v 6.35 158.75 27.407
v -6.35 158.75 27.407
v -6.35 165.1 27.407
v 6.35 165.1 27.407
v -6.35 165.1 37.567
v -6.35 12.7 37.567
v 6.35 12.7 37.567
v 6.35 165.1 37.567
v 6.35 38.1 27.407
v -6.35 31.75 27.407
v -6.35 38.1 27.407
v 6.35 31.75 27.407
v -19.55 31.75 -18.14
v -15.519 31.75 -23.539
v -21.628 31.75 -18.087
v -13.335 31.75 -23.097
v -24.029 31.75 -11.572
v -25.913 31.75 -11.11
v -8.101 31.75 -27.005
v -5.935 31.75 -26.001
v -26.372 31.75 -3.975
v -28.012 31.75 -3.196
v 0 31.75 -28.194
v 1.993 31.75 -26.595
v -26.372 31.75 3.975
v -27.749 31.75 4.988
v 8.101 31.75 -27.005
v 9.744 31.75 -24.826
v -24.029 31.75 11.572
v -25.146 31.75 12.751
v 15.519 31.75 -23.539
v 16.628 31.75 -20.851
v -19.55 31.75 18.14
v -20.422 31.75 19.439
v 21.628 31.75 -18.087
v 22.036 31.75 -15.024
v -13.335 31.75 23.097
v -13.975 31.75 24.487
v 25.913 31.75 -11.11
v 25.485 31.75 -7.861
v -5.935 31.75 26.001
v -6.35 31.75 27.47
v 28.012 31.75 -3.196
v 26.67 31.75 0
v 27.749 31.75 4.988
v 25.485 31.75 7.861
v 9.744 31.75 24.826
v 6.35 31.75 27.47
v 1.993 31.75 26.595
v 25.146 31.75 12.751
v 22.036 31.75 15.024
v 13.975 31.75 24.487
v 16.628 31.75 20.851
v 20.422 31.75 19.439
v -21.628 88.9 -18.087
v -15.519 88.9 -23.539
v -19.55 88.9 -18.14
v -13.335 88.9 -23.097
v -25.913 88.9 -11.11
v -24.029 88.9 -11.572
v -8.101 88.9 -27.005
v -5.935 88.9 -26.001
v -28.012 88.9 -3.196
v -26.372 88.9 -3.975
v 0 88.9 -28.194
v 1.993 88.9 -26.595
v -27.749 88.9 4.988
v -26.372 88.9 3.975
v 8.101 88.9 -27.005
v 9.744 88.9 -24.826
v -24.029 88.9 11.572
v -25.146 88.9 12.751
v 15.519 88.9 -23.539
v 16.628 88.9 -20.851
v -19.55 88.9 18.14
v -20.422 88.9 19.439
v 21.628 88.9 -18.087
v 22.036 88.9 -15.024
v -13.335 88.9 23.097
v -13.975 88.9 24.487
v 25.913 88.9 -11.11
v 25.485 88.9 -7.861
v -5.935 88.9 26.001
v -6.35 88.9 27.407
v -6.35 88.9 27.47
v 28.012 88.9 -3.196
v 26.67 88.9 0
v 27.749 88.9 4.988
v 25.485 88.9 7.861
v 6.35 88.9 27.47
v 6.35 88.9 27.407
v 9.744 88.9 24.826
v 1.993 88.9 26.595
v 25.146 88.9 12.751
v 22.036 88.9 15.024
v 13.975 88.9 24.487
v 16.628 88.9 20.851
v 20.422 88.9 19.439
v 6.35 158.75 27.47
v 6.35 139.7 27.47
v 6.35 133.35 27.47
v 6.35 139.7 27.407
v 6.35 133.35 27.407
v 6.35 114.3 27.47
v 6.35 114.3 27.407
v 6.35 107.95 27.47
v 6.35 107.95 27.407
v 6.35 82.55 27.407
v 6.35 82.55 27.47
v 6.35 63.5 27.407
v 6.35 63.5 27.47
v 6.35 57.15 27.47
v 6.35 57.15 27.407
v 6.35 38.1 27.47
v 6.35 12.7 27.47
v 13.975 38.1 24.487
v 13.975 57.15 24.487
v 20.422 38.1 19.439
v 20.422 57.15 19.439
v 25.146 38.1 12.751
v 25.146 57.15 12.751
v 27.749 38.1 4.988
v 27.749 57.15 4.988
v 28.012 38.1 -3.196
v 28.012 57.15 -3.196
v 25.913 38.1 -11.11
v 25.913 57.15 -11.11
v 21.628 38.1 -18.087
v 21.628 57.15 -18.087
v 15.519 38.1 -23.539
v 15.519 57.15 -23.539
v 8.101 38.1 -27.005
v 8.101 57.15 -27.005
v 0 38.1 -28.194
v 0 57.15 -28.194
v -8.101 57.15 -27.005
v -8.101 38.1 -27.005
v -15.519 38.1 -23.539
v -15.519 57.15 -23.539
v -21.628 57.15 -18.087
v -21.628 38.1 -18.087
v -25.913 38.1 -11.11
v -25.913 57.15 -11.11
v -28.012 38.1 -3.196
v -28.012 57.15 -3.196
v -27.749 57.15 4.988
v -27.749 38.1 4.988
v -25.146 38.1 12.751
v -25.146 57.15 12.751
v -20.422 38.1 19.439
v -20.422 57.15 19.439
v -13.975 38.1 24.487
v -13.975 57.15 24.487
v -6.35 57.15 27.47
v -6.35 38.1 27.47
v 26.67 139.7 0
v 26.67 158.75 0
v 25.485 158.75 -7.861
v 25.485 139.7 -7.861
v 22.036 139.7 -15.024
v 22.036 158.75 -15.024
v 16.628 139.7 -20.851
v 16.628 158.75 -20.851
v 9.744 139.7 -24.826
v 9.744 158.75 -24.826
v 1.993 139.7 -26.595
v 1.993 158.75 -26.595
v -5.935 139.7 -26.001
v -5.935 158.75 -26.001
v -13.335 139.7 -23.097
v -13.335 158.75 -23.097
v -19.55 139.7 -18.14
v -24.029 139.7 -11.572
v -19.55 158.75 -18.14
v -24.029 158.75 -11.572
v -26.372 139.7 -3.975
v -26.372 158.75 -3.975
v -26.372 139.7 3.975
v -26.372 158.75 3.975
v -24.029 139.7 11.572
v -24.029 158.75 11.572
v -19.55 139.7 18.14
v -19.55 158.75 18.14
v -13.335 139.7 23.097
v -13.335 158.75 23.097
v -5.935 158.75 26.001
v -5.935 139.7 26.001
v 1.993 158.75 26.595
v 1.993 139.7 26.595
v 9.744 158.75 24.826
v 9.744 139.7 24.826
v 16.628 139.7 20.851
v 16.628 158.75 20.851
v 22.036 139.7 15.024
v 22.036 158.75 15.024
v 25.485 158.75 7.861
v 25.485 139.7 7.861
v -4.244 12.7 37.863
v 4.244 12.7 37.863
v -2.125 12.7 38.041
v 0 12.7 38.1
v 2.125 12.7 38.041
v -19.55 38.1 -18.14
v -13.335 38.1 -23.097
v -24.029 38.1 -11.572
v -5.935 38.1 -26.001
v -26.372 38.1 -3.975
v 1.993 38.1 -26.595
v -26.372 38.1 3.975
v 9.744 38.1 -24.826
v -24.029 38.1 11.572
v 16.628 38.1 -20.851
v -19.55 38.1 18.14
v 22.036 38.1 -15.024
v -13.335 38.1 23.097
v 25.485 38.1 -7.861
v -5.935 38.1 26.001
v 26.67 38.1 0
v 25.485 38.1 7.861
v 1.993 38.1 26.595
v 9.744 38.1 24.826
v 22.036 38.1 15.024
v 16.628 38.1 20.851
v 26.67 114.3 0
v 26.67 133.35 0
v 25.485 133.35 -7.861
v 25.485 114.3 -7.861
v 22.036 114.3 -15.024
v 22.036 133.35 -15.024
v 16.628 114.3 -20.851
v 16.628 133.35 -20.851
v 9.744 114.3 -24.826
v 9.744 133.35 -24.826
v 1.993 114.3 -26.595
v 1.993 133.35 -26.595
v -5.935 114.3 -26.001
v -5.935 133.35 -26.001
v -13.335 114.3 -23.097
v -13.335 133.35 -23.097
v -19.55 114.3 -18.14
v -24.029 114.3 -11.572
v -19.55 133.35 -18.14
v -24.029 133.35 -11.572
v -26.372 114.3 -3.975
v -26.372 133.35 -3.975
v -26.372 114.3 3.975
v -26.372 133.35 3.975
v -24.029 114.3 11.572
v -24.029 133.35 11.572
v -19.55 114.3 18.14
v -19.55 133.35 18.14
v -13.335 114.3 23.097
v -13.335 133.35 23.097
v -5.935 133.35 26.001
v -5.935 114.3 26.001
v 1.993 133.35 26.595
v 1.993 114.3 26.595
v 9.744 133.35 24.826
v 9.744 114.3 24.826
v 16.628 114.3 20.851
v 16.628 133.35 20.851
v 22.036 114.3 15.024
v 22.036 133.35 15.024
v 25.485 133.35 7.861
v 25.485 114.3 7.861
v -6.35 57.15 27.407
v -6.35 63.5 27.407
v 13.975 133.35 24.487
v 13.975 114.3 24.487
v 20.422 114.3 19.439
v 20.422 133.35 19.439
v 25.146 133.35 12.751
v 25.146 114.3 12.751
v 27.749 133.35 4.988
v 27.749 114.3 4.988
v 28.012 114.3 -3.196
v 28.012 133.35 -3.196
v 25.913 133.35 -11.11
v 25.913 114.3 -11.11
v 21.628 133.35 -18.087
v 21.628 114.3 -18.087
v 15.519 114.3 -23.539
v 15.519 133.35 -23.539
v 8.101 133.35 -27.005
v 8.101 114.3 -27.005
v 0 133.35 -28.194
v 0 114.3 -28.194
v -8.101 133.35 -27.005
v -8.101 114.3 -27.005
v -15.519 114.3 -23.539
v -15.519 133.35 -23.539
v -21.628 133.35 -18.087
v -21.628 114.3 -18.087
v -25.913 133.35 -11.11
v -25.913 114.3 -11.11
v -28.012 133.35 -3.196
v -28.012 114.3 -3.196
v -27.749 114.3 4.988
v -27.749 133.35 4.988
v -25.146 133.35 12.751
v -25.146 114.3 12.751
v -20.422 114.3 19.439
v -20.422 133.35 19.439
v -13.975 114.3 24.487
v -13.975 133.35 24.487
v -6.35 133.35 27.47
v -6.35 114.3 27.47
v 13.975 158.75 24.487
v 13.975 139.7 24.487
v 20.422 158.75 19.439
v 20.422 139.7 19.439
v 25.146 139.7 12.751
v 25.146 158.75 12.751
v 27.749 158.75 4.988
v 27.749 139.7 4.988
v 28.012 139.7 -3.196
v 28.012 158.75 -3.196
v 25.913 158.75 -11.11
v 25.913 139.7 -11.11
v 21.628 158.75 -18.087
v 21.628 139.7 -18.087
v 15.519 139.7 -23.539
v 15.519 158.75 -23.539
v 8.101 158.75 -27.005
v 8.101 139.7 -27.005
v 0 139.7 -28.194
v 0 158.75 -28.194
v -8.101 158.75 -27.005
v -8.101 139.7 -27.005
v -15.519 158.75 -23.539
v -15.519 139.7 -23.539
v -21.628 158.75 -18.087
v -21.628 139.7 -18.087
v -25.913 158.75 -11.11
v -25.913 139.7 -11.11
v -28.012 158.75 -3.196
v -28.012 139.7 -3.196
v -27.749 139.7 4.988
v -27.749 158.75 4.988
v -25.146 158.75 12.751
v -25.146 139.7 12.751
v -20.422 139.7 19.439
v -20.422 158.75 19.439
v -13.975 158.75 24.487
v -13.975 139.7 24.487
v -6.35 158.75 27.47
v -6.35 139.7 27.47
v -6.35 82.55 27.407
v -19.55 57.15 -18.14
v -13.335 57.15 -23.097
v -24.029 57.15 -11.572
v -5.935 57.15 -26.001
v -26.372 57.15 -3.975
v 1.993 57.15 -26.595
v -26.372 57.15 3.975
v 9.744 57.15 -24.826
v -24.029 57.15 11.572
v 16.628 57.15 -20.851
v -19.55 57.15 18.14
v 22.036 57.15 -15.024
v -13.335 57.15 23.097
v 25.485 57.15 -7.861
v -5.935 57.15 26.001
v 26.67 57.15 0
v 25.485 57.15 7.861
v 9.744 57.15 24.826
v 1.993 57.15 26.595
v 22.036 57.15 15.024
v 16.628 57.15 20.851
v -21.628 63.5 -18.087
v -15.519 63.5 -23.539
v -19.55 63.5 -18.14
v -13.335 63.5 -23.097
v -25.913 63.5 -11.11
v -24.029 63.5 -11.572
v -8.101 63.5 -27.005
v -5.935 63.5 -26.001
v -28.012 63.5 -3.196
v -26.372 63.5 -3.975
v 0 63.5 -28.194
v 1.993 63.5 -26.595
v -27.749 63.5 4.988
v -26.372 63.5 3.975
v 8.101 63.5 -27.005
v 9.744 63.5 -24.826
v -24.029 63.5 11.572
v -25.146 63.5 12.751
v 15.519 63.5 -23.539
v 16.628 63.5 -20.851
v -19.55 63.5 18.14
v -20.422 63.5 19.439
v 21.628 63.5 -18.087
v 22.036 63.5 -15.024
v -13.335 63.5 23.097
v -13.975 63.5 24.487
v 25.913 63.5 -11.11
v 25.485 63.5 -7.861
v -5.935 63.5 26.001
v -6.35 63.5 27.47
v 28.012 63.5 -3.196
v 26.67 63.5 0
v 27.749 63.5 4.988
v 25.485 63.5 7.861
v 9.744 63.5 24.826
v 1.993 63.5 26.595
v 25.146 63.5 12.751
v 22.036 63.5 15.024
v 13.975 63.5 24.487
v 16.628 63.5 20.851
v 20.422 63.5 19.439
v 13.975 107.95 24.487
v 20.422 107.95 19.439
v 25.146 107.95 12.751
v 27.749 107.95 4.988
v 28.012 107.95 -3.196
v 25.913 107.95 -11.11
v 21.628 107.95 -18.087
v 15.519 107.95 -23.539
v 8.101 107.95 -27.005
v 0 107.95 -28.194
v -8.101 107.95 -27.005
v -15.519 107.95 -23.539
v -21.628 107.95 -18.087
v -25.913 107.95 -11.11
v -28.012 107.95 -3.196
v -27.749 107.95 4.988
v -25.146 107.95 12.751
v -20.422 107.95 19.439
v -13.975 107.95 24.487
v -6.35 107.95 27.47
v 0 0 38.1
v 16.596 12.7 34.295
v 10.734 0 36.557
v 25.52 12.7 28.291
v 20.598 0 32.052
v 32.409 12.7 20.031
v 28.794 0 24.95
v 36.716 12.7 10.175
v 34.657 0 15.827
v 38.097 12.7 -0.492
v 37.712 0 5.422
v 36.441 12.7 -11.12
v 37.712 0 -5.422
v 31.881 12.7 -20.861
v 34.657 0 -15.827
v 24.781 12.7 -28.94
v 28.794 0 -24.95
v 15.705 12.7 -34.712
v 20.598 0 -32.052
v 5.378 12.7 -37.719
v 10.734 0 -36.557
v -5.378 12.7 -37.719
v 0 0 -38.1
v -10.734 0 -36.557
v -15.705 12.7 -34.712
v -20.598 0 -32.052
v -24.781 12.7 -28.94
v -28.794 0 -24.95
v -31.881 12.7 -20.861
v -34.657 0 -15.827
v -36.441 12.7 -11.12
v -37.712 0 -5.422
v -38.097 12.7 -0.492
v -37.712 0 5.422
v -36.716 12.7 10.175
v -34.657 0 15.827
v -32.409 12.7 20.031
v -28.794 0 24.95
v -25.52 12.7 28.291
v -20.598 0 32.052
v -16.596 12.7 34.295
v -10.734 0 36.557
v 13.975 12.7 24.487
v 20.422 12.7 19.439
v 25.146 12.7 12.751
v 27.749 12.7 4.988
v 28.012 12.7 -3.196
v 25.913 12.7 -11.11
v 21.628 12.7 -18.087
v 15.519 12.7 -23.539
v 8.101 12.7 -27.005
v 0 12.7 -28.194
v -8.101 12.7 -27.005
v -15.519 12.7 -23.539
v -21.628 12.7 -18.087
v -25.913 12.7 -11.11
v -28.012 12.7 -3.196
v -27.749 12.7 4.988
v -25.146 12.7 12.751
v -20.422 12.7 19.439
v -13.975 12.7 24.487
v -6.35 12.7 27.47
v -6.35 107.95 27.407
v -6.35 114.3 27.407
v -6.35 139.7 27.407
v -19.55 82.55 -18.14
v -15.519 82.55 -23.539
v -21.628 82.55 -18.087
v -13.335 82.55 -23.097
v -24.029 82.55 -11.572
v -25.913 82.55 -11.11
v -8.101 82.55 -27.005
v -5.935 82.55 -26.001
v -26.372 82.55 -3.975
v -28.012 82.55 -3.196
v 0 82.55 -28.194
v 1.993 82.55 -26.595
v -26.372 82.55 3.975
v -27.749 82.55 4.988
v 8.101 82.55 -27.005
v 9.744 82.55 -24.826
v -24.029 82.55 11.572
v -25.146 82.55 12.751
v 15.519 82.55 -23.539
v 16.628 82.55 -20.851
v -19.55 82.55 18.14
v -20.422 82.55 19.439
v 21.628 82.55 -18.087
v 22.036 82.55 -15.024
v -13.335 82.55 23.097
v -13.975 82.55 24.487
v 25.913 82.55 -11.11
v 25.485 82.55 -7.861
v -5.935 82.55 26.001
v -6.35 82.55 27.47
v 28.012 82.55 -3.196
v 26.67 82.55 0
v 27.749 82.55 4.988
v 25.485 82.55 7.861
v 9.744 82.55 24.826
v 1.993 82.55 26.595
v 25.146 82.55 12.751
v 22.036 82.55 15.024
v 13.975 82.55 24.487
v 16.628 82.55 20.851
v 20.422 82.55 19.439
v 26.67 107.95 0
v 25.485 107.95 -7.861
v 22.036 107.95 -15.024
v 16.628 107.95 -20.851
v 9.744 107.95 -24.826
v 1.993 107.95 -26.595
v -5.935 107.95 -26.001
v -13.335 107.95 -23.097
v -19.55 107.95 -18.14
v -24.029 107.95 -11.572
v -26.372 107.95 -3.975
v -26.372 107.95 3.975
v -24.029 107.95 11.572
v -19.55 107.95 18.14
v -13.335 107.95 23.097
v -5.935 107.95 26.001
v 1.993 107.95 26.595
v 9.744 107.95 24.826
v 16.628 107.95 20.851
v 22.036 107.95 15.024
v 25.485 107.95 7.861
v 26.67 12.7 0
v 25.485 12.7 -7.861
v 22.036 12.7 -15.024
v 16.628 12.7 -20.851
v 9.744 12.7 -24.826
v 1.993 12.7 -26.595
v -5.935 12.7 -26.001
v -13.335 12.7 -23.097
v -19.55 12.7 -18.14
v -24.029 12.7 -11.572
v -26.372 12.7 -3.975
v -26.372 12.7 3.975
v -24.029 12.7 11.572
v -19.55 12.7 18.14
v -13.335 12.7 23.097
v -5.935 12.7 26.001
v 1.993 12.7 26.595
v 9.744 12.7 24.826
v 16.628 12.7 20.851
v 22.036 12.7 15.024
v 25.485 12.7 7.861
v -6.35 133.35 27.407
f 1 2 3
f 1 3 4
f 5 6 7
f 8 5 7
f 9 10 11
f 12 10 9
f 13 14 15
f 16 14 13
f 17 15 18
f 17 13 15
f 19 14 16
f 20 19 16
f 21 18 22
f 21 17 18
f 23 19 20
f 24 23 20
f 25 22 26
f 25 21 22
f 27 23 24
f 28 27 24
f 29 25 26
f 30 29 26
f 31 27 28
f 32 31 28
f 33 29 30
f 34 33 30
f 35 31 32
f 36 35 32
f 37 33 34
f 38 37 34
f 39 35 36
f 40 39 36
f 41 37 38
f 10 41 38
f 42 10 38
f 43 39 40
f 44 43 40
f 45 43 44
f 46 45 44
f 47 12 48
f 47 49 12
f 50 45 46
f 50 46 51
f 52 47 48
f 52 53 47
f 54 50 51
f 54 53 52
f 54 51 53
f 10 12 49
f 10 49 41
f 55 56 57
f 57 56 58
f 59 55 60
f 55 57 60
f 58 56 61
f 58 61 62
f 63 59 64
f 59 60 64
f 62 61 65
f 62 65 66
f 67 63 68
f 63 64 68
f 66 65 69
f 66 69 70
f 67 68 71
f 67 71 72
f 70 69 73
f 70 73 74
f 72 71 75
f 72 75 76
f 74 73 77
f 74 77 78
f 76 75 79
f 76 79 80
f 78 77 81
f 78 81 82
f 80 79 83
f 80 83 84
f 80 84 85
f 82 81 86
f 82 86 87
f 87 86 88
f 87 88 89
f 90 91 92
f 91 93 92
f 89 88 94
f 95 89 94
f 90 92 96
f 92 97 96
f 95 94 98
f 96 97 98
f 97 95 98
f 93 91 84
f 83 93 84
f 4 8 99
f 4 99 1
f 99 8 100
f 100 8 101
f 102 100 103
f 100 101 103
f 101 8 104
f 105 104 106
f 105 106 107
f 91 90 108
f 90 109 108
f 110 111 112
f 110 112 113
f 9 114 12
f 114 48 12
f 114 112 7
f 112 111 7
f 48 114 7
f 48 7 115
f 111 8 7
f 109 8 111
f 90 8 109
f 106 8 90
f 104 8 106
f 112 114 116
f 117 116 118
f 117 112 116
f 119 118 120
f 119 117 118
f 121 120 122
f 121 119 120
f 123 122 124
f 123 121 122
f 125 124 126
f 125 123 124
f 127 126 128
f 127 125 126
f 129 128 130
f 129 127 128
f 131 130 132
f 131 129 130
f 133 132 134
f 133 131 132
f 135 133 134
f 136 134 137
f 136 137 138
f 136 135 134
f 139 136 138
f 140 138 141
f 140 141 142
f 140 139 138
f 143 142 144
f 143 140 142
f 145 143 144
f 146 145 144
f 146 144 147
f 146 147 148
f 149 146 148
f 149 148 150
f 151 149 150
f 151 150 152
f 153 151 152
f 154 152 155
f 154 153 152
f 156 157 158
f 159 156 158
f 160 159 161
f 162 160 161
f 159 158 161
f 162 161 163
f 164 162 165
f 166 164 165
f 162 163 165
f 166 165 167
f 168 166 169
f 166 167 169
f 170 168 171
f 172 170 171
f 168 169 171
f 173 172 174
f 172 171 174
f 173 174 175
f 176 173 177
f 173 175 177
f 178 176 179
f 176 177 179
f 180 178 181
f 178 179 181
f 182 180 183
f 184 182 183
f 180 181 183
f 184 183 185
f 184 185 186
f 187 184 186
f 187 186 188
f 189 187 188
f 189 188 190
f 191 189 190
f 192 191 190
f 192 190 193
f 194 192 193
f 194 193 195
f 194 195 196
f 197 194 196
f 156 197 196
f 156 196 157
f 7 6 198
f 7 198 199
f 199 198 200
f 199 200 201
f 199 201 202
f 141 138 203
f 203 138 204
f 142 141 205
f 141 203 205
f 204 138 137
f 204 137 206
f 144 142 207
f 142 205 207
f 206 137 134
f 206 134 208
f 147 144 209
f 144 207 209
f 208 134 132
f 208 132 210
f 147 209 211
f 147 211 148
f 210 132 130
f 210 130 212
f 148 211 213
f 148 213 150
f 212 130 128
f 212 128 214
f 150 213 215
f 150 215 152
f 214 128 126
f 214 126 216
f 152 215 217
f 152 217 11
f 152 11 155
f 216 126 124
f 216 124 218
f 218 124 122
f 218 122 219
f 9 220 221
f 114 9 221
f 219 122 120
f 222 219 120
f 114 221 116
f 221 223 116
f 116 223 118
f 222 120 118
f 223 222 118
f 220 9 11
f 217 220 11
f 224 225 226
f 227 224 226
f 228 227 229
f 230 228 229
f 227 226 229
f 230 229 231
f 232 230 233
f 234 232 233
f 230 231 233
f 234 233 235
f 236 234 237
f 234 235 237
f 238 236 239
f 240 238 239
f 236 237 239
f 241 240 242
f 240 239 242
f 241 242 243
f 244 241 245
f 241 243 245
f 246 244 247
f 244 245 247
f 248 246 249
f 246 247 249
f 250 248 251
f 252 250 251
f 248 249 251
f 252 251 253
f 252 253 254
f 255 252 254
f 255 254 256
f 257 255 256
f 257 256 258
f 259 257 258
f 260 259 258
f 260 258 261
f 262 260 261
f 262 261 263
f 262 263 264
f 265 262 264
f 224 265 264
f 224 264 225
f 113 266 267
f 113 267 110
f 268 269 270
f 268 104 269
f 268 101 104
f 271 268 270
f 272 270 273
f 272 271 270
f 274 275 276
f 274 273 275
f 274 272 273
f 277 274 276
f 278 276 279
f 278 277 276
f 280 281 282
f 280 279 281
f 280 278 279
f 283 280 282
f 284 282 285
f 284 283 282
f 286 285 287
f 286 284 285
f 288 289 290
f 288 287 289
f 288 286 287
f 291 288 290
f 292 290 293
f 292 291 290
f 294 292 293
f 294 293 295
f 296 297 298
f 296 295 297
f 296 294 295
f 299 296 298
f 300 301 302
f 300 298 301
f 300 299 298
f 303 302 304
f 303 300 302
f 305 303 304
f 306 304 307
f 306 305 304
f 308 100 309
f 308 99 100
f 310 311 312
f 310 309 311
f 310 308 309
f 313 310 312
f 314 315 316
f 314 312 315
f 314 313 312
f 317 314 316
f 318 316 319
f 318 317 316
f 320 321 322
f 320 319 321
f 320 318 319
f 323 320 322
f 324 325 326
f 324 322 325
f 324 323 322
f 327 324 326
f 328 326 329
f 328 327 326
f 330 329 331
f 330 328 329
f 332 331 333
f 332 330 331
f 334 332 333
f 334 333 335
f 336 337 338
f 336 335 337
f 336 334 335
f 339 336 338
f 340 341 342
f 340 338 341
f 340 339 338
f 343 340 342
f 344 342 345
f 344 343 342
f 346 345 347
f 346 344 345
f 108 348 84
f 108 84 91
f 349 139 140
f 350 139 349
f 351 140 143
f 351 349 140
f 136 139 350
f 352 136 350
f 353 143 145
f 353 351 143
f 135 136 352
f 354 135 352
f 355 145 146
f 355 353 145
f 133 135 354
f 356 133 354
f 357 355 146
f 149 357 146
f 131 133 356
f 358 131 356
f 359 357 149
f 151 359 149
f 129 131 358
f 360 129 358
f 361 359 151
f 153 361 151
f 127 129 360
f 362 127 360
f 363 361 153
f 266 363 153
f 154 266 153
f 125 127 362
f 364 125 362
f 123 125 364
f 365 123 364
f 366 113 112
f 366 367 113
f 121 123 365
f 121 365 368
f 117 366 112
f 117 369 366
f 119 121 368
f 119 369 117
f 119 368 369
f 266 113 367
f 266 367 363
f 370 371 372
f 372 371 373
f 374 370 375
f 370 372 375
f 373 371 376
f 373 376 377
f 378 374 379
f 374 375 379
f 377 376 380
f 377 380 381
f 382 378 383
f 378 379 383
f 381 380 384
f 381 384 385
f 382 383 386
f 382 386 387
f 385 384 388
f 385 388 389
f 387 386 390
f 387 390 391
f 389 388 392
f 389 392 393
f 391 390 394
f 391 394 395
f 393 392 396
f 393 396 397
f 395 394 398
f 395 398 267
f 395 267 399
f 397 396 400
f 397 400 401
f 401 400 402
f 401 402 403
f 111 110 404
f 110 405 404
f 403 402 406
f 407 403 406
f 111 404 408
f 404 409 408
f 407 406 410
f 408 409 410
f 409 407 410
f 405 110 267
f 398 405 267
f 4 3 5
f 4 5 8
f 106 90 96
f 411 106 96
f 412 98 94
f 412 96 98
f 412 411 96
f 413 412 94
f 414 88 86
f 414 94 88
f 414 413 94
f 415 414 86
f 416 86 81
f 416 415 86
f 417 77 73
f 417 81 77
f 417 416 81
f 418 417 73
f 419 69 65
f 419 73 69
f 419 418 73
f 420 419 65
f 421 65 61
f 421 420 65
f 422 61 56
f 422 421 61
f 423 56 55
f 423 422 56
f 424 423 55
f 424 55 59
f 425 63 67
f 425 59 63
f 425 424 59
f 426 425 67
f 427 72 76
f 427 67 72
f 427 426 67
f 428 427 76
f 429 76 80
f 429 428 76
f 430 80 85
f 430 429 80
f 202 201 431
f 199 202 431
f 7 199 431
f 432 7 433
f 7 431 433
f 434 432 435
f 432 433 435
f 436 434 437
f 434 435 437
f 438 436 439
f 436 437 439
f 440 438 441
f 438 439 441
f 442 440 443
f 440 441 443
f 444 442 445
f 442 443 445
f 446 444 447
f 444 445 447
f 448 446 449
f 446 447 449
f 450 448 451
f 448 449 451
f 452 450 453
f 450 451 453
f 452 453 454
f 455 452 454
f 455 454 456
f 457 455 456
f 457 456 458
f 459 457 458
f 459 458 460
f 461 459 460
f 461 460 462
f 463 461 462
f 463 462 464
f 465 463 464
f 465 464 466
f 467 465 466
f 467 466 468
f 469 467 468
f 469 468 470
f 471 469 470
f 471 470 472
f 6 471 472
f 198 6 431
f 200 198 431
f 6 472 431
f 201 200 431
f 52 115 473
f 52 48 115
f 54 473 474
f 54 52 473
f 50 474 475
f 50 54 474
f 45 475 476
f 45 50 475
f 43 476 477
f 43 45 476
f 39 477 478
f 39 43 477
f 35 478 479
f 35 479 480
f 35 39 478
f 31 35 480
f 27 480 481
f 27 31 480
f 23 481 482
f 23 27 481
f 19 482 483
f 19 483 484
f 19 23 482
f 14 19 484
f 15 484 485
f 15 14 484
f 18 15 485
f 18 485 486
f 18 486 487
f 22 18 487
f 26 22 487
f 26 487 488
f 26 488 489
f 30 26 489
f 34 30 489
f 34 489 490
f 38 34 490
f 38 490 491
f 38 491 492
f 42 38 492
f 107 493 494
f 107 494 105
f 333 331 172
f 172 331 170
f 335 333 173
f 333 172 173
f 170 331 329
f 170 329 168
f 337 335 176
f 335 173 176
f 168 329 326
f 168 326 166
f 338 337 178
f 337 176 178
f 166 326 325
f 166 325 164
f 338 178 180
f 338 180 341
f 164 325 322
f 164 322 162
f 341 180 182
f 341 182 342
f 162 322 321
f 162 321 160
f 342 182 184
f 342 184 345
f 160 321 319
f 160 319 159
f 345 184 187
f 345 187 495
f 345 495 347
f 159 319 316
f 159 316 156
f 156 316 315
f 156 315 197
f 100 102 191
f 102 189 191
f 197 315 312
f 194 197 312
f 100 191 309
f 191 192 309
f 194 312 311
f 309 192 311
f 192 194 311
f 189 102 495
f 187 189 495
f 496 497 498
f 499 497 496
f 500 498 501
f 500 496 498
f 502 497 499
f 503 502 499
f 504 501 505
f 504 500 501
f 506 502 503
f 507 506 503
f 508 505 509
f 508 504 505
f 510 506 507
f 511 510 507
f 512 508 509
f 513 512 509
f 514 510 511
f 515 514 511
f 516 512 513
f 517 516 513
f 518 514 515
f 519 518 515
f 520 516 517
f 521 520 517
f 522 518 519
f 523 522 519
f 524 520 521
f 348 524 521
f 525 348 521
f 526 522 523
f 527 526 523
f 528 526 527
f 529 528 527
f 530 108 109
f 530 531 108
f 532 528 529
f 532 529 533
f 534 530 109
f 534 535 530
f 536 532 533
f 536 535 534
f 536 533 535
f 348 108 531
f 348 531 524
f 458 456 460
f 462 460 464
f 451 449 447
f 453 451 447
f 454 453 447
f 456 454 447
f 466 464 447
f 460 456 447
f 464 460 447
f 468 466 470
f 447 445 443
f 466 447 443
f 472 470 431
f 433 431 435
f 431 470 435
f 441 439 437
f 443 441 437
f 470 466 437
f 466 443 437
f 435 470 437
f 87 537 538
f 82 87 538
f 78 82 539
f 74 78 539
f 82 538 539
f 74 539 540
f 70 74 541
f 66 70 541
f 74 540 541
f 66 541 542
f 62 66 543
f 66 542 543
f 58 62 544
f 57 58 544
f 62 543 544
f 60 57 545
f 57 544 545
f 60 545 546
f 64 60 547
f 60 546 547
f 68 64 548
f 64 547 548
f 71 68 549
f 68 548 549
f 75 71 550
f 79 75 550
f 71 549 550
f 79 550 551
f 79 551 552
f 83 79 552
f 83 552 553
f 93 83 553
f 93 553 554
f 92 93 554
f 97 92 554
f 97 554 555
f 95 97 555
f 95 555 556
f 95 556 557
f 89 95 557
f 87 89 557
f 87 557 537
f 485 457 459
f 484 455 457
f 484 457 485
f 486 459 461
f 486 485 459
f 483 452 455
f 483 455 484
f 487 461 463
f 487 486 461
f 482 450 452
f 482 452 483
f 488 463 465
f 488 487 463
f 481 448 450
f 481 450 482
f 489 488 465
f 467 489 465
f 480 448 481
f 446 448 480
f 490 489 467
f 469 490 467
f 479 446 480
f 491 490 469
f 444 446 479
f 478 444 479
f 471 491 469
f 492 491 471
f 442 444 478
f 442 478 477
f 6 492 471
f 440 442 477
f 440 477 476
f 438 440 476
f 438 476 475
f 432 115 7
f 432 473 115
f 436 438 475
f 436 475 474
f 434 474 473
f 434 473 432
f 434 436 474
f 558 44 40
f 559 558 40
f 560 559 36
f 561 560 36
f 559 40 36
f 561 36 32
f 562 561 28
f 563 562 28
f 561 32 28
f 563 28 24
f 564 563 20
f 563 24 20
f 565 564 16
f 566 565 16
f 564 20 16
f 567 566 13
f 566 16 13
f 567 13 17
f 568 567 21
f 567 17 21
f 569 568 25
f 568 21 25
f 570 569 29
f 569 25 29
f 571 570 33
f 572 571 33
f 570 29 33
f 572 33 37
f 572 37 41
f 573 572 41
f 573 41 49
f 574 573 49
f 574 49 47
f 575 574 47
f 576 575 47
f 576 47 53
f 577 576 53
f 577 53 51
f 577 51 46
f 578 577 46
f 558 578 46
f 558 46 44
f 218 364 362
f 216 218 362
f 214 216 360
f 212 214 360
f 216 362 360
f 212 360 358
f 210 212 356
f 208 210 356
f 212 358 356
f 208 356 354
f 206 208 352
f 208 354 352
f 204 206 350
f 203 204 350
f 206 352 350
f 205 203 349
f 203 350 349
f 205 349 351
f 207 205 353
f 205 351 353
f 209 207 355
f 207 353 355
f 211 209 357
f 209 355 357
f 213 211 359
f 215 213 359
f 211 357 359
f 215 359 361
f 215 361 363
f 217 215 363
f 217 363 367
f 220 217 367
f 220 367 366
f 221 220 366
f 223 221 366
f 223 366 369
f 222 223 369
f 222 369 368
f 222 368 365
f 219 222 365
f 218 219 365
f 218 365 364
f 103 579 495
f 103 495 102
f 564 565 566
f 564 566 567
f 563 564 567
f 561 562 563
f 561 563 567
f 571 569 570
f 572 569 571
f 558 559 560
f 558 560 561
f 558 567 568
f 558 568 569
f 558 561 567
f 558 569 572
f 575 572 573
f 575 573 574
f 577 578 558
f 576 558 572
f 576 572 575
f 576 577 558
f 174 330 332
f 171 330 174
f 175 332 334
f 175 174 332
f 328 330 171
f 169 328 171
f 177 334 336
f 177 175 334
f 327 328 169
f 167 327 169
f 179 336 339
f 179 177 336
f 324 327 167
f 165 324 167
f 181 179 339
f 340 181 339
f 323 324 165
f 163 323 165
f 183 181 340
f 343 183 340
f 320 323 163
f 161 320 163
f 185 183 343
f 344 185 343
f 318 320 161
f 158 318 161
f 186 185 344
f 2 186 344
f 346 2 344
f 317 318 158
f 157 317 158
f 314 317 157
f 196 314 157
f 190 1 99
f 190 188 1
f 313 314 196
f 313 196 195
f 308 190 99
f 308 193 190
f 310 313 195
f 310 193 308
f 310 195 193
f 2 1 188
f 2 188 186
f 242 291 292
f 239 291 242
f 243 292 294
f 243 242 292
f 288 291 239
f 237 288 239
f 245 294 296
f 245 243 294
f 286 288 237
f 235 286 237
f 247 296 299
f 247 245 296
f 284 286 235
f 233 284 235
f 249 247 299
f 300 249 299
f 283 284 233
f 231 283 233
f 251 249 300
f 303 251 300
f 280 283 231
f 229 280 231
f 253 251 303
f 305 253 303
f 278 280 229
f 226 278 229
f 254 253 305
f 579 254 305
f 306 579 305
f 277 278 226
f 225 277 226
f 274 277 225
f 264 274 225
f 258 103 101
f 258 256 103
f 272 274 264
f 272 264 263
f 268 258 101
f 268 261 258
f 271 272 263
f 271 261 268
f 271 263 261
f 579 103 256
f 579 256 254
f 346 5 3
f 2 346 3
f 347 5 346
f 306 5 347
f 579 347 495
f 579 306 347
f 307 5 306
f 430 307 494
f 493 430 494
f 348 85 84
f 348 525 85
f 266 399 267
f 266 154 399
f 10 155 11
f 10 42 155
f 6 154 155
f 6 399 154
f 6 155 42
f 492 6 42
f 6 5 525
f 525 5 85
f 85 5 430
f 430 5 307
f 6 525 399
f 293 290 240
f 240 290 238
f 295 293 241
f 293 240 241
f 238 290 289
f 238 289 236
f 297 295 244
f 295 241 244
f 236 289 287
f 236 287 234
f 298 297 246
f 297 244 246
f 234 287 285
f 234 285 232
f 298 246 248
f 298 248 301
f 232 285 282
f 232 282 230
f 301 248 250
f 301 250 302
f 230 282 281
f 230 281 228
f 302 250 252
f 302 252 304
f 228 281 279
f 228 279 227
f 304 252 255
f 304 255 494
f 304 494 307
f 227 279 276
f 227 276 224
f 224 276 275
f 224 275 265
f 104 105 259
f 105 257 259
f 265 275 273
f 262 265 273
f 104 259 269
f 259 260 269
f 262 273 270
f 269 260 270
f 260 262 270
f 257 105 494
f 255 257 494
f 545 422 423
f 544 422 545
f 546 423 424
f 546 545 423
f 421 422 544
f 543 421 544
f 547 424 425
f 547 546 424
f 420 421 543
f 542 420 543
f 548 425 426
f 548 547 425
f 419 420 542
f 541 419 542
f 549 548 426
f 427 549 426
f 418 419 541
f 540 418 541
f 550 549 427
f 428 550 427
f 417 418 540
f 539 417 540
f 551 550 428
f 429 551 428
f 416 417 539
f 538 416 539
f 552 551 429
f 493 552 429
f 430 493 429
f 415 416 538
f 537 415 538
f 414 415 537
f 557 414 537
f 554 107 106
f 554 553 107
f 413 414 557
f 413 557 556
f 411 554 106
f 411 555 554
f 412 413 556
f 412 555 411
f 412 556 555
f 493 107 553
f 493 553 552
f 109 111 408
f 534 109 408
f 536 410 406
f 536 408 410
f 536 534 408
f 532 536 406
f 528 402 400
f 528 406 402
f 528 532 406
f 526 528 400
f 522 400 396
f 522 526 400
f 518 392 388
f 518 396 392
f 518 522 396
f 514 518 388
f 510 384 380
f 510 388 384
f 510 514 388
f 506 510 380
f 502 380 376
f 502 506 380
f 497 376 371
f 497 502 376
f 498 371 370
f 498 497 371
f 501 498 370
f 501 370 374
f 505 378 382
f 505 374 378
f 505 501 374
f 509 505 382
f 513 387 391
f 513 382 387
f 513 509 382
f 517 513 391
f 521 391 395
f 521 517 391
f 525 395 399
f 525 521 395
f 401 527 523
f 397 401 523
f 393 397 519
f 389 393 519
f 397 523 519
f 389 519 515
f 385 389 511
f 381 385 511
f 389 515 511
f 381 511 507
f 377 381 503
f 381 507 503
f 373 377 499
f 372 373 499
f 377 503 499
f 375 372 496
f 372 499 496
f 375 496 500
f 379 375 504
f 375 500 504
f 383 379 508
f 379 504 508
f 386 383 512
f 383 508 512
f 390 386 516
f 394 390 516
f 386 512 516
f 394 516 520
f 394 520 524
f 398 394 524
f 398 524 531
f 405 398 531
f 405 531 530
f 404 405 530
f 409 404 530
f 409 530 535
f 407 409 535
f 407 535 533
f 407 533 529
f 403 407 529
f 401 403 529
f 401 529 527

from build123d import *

# Parameters (mm, degrees)
SKETCH2_R           = 38.1
BOSS_EXTRUDE1_DEPTH = 12.7
SKETCH3_W           = 12.7
SKETCH3_H           = 10.16
BOSS_EXTRUDE2_DEPTH = 152.4
SKETCH4_R           = 28.194
SKETCH4_R_2         = 26.67
LPATTERN1_COUNT     = 6
LPATTERN1_PITCH     = 25.4


with BuildPart() as part:
    # Sketch2 → Boss-Extrude1 (new body)
    with BuildSketch(Plane(origin=(0, 0, 0), x_dir=(1, 0, 0), z_dir=(0, 1, 0))):
        with Locations(Location((0, 0, 0), (0, 0, 270))):
            Circle(SKETCH2_R)
    extrude(amount=BOSS_EXTRUDE1_DEPTH)

    # Sketch3 → Boss-Extrude2 (add)
    with BuildSketch(Plane(origin=(0, 12.7, 0), x_dir=(1, 0, 0), z_dir=(0, 1, 0))):
        with Locations((0, -32.487106623)):
            Rectangle(SKETCH3_W, SKETCH3_H)
    extrude(amount=BOSS_EXTRUDE2_DEPTH)

    # Sweep-Thin1: sweep along a path in Sketch5
    with BuildLine(Plane.XY) as sweep_thin1_path:
        Line((0, 12.7), (0, 31.75))
    # Sketch4 → Sweep-Thin1 (sweep)
    with BuildSketch(Plane(origin=(0, 12.7, 0), x_dir=(1, 0, 0), z_dir=(0, 1, 0))):
        Circle(SKETCH4_R)
        Circle(SKETCH4_R_2, mode=Mode.SUBTRACT)
    sweep_thin1 = sweep(path=sweep_thin1_path.line)

    # LPattern1: Sweep-Thin1 ×6
    with Locations(*[(0, i * LPATTERN1_PITCH, 0) for i in range(1, LPATTERN1_COUNT)]):
        add(sweep_thin1)


solid = part.part
